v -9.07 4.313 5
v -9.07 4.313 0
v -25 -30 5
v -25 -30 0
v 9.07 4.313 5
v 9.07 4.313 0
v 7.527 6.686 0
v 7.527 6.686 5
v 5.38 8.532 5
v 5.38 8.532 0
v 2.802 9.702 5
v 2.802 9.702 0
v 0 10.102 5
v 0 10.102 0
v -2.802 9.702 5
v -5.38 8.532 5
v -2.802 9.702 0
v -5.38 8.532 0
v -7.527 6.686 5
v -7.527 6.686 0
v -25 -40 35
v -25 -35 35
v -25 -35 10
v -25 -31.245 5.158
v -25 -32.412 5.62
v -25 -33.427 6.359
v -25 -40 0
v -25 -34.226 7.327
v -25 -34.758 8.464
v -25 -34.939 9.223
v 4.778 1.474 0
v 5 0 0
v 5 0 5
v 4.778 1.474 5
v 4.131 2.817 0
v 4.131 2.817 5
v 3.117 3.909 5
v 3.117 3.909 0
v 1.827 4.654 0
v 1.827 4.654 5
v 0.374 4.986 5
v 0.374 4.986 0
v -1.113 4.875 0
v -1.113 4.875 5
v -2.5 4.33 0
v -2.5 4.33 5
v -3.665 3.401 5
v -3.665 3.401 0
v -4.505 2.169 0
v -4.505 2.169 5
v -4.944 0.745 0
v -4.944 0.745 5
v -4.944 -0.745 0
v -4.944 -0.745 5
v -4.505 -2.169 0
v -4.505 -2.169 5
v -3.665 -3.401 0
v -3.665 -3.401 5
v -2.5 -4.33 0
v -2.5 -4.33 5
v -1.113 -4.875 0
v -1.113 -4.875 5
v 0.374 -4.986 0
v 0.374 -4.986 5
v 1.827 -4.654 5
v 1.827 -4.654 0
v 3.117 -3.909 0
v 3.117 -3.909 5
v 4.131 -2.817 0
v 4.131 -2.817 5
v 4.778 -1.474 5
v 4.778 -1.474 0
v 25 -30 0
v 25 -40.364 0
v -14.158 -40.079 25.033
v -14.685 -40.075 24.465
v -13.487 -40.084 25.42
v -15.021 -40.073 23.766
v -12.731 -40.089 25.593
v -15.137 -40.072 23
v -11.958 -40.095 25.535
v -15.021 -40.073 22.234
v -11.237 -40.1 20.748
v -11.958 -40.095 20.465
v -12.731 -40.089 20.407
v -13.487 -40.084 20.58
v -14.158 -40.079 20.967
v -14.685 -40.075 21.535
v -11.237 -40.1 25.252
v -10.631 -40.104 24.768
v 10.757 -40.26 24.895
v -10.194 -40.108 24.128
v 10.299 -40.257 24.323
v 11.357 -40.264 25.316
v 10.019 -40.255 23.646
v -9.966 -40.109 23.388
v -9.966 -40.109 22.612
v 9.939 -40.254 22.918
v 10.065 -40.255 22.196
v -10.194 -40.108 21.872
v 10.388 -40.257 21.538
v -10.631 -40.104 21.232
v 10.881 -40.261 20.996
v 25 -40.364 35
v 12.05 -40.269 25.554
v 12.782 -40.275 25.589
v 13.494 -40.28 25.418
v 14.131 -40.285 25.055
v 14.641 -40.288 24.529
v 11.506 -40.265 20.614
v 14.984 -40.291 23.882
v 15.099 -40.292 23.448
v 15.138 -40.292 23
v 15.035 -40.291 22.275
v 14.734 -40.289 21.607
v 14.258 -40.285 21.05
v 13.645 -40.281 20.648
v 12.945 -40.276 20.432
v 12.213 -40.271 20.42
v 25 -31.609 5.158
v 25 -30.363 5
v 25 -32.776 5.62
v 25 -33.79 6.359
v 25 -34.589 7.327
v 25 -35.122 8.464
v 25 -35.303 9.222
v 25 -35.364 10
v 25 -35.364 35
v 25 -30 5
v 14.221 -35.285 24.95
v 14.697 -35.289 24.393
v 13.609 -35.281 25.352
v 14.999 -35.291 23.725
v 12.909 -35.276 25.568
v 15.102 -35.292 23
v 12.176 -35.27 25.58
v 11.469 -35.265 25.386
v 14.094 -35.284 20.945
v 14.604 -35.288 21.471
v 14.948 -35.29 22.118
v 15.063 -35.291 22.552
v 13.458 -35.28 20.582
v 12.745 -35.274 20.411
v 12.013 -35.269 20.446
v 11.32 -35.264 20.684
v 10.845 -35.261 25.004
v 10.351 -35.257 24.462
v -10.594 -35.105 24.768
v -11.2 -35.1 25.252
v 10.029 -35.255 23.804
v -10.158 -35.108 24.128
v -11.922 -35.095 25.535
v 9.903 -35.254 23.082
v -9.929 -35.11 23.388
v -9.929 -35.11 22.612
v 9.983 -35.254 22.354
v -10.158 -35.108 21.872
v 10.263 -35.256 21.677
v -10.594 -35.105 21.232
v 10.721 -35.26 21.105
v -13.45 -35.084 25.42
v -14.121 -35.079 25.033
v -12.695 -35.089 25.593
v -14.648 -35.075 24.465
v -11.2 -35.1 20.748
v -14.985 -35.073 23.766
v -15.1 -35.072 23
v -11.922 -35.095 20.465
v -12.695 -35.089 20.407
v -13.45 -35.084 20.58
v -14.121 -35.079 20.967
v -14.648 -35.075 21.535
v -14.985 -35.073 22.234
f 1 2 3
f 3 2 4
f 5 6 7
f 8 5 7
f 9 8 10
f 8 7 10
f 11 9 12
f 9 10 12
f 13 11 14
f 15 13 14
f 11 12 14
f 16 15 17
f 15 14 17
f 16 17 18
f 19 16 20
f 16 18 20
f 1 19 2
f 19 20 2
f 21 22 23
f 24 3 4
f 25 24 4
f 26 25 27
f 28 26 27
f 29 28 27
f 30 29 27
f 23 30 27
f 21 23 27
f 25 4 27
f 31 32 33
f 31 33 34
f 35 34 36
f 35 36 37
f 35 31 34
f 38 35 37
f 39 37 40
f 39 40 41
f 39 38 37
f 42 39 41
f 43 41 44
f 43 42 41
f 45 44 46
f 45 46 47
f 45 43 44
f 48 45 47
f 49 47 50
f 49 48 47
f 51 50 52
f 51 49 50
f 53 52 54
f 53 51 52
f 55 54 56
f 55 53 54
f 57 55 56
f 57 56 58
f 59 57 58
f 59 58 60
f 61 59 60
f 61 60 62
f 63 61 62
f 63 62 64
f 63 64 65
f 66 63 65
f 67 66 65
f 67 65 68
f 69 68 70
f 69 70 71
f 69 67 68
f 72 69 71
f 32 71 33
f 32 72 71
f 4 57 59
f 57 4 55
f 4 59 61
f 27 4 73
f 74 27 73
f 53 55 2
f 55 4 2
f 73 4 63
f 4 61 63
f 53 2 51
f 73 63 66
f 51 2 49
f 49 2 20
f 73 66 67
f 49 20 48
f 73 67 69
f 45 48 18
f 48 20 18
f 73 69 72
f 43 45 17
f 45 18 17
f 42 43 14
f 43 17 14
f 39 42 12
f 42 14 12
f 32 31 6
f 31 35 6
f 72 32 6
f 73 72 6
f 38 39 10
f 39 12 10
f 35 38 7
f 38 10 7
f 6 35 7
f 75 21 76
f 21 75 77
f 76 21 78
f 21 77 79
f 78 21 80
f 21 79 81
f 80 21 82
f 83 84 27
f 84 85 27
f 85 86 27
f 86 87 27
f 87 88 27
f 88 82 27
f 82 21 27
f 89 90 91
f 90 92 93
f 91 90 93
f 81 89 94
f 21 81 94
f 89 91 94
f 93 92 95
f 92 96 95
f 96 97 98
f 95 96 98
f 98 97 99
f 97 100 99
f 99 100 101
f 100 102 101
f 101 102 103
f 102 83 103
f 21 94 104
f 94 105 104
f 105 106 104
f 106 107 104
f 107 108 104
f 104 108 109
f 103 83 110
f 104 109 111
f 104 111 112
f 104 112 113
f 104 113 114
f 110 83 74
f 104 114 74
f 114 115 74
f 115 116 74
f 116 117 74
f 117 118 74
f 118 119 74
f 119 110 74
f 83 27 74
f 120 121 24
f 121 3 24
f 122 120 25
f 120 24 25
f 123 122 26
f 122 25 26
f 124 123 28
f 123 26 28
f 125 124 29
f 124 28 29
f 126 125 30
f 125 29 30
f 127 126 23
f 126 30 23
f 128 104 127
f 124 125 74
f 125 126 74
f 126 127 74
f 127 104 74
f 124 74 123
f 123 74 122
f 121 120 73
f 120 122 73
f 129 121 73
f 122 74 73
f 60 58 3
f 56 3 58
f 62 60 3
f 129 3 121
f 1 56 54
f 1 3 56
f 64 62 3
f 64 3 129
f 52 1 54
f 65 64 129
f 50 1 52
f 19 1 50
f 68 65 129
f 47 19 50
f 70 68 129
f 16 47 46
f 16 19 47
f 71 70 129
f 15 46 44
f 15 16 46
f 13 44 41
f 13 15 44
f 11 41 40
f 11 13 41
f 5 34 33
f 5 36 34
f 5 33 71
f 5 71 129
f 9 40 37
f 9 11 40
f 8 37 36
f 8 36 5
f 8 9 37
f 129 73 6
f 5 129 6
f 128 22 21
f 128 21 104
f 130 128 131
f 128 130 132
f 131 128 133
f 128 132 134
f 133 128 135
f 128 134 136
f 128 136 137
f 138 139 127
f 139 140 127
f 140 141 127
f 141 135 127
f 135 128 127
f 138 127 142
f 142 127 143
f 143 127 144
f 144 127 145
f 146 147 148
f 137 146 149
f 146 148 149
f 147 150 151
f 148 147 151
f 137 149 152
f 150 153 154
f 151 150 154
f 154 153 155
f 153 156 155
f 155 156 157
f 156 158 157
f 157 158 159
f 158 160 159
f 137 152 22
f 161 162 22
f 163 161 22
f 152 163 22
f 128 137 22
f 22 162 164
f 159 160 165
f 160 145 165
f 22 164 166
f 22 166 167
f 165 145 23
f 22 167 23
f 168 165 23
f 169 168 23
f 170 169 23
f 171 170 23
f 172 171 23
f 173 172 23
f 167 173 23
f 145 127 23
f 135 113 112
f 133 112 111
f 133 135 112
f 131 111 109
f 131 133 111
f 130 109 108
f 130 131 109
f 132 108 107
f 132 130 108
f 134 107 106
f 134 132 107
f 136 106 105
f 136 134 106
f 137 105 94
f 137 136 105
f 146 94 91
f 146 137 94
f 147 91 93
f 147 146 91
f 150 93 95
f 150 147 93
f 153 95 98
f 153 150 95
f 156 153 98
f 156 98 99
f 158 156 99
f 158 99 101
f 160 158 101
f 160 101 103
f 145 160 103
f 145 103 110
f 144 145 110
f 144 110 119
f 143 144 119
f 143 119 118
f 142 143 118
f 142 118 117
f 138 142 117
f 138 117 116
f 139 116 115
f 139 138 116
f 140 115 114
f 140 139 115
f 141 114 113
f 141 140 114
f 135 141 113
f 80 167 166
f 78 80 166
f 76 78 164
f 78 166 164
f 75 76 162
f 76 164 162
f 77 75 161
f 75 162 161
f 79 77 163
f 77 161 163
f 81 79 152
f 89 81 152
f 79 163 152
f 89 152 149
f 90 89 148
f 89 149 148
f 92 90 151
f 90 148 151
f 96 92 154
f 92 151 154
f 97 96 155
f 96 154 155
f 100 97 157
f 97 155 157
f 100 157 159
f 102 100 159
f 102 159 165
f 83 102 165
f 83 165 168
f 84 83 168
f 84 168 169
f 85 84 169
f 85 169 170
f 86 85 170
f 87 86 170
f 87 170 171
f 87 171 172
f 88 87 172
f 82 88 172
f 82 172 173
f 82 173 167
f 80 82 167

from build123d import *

# Parameters (mm, degrees)
SKETCH1_R           = 5
BOSS_EXTRUDE1_DEPTH = 5
BOSS_EXTRUDE2_DEPTH = 30
FILLET1_R           = 5
SKETCH7_R           = 2.6
CUT_EXTRUDE1_DEPTH  = 30


with BuildPart() as part:
    # Sketch1 → Boss-Extrude1 (new body)
    with BuildSketch(Plane.XY):
        with BuildLine():
            Line((-9.070221734, 4.313108884), (-25, -30))
            Line((-25, -30), (-25, -40))
            Line((-25, -40), (25, -40.363582182))
            Line((25, -40.363582182), (25, -30))
            Line((25, -30), (9.070221734, 4.313108884))
            ThreePointArc((9.070221734, 4.313108884), (0, 10.102280261), (-9.070221734, 4.313108884))
        make_face()
        Circle(SKETCH1_R, mode=Mode.SUBTRACT)
    extrude(amount=BOSS_EXTRUDE1_DEPTH)

    # Sketch6 → Boss-Extrude2 (add)
    with BuildSketch(Plane.XY.offset(5)):
        Polygon((-25, -35), (-25, -40), (25, -40.363582182), (25, -35.363582182), align=None)
    extrude(amount=BOSS_EXTRUDE2_DEPTH)

    # Fillet1
    fillet1_edges = [part.edges().sort_by_distance(p)[0] for p in [
        (0, -35.181791091, 5),
    ]]
    fillet(fillet1_edges, radius=FILLET1_R)

    # Sketch7 → Cut-Extrude1 (cut)
    with BuildSketch(Plane(origin=(-0.255815921, -35.179930889, 0), x_dir=(0.9999735626477819, -0.0072714514027518145, 0), z_dir=(0.007271451402751815, 0.999973562647782, 0))):
        with Locations(Location((-12.244838267, -23, 0), (0, 0, 180))):
            Circle(SKETCH7_R)
    cut_extrude1 = extrude(amount=-CUT_EXTRUDE1_DEPTH, mode=Mode.SUBTRACT)

    # Mirror2: Cut-Extrude1 across plane
    add(cut_extrude1.mirror(Plane(origin=(0, 0, 0), x_dir=(0, 0, 1), z_dir=(1, 0, 0))), mode=Mode.SUBTRACT)


solid = part.part
